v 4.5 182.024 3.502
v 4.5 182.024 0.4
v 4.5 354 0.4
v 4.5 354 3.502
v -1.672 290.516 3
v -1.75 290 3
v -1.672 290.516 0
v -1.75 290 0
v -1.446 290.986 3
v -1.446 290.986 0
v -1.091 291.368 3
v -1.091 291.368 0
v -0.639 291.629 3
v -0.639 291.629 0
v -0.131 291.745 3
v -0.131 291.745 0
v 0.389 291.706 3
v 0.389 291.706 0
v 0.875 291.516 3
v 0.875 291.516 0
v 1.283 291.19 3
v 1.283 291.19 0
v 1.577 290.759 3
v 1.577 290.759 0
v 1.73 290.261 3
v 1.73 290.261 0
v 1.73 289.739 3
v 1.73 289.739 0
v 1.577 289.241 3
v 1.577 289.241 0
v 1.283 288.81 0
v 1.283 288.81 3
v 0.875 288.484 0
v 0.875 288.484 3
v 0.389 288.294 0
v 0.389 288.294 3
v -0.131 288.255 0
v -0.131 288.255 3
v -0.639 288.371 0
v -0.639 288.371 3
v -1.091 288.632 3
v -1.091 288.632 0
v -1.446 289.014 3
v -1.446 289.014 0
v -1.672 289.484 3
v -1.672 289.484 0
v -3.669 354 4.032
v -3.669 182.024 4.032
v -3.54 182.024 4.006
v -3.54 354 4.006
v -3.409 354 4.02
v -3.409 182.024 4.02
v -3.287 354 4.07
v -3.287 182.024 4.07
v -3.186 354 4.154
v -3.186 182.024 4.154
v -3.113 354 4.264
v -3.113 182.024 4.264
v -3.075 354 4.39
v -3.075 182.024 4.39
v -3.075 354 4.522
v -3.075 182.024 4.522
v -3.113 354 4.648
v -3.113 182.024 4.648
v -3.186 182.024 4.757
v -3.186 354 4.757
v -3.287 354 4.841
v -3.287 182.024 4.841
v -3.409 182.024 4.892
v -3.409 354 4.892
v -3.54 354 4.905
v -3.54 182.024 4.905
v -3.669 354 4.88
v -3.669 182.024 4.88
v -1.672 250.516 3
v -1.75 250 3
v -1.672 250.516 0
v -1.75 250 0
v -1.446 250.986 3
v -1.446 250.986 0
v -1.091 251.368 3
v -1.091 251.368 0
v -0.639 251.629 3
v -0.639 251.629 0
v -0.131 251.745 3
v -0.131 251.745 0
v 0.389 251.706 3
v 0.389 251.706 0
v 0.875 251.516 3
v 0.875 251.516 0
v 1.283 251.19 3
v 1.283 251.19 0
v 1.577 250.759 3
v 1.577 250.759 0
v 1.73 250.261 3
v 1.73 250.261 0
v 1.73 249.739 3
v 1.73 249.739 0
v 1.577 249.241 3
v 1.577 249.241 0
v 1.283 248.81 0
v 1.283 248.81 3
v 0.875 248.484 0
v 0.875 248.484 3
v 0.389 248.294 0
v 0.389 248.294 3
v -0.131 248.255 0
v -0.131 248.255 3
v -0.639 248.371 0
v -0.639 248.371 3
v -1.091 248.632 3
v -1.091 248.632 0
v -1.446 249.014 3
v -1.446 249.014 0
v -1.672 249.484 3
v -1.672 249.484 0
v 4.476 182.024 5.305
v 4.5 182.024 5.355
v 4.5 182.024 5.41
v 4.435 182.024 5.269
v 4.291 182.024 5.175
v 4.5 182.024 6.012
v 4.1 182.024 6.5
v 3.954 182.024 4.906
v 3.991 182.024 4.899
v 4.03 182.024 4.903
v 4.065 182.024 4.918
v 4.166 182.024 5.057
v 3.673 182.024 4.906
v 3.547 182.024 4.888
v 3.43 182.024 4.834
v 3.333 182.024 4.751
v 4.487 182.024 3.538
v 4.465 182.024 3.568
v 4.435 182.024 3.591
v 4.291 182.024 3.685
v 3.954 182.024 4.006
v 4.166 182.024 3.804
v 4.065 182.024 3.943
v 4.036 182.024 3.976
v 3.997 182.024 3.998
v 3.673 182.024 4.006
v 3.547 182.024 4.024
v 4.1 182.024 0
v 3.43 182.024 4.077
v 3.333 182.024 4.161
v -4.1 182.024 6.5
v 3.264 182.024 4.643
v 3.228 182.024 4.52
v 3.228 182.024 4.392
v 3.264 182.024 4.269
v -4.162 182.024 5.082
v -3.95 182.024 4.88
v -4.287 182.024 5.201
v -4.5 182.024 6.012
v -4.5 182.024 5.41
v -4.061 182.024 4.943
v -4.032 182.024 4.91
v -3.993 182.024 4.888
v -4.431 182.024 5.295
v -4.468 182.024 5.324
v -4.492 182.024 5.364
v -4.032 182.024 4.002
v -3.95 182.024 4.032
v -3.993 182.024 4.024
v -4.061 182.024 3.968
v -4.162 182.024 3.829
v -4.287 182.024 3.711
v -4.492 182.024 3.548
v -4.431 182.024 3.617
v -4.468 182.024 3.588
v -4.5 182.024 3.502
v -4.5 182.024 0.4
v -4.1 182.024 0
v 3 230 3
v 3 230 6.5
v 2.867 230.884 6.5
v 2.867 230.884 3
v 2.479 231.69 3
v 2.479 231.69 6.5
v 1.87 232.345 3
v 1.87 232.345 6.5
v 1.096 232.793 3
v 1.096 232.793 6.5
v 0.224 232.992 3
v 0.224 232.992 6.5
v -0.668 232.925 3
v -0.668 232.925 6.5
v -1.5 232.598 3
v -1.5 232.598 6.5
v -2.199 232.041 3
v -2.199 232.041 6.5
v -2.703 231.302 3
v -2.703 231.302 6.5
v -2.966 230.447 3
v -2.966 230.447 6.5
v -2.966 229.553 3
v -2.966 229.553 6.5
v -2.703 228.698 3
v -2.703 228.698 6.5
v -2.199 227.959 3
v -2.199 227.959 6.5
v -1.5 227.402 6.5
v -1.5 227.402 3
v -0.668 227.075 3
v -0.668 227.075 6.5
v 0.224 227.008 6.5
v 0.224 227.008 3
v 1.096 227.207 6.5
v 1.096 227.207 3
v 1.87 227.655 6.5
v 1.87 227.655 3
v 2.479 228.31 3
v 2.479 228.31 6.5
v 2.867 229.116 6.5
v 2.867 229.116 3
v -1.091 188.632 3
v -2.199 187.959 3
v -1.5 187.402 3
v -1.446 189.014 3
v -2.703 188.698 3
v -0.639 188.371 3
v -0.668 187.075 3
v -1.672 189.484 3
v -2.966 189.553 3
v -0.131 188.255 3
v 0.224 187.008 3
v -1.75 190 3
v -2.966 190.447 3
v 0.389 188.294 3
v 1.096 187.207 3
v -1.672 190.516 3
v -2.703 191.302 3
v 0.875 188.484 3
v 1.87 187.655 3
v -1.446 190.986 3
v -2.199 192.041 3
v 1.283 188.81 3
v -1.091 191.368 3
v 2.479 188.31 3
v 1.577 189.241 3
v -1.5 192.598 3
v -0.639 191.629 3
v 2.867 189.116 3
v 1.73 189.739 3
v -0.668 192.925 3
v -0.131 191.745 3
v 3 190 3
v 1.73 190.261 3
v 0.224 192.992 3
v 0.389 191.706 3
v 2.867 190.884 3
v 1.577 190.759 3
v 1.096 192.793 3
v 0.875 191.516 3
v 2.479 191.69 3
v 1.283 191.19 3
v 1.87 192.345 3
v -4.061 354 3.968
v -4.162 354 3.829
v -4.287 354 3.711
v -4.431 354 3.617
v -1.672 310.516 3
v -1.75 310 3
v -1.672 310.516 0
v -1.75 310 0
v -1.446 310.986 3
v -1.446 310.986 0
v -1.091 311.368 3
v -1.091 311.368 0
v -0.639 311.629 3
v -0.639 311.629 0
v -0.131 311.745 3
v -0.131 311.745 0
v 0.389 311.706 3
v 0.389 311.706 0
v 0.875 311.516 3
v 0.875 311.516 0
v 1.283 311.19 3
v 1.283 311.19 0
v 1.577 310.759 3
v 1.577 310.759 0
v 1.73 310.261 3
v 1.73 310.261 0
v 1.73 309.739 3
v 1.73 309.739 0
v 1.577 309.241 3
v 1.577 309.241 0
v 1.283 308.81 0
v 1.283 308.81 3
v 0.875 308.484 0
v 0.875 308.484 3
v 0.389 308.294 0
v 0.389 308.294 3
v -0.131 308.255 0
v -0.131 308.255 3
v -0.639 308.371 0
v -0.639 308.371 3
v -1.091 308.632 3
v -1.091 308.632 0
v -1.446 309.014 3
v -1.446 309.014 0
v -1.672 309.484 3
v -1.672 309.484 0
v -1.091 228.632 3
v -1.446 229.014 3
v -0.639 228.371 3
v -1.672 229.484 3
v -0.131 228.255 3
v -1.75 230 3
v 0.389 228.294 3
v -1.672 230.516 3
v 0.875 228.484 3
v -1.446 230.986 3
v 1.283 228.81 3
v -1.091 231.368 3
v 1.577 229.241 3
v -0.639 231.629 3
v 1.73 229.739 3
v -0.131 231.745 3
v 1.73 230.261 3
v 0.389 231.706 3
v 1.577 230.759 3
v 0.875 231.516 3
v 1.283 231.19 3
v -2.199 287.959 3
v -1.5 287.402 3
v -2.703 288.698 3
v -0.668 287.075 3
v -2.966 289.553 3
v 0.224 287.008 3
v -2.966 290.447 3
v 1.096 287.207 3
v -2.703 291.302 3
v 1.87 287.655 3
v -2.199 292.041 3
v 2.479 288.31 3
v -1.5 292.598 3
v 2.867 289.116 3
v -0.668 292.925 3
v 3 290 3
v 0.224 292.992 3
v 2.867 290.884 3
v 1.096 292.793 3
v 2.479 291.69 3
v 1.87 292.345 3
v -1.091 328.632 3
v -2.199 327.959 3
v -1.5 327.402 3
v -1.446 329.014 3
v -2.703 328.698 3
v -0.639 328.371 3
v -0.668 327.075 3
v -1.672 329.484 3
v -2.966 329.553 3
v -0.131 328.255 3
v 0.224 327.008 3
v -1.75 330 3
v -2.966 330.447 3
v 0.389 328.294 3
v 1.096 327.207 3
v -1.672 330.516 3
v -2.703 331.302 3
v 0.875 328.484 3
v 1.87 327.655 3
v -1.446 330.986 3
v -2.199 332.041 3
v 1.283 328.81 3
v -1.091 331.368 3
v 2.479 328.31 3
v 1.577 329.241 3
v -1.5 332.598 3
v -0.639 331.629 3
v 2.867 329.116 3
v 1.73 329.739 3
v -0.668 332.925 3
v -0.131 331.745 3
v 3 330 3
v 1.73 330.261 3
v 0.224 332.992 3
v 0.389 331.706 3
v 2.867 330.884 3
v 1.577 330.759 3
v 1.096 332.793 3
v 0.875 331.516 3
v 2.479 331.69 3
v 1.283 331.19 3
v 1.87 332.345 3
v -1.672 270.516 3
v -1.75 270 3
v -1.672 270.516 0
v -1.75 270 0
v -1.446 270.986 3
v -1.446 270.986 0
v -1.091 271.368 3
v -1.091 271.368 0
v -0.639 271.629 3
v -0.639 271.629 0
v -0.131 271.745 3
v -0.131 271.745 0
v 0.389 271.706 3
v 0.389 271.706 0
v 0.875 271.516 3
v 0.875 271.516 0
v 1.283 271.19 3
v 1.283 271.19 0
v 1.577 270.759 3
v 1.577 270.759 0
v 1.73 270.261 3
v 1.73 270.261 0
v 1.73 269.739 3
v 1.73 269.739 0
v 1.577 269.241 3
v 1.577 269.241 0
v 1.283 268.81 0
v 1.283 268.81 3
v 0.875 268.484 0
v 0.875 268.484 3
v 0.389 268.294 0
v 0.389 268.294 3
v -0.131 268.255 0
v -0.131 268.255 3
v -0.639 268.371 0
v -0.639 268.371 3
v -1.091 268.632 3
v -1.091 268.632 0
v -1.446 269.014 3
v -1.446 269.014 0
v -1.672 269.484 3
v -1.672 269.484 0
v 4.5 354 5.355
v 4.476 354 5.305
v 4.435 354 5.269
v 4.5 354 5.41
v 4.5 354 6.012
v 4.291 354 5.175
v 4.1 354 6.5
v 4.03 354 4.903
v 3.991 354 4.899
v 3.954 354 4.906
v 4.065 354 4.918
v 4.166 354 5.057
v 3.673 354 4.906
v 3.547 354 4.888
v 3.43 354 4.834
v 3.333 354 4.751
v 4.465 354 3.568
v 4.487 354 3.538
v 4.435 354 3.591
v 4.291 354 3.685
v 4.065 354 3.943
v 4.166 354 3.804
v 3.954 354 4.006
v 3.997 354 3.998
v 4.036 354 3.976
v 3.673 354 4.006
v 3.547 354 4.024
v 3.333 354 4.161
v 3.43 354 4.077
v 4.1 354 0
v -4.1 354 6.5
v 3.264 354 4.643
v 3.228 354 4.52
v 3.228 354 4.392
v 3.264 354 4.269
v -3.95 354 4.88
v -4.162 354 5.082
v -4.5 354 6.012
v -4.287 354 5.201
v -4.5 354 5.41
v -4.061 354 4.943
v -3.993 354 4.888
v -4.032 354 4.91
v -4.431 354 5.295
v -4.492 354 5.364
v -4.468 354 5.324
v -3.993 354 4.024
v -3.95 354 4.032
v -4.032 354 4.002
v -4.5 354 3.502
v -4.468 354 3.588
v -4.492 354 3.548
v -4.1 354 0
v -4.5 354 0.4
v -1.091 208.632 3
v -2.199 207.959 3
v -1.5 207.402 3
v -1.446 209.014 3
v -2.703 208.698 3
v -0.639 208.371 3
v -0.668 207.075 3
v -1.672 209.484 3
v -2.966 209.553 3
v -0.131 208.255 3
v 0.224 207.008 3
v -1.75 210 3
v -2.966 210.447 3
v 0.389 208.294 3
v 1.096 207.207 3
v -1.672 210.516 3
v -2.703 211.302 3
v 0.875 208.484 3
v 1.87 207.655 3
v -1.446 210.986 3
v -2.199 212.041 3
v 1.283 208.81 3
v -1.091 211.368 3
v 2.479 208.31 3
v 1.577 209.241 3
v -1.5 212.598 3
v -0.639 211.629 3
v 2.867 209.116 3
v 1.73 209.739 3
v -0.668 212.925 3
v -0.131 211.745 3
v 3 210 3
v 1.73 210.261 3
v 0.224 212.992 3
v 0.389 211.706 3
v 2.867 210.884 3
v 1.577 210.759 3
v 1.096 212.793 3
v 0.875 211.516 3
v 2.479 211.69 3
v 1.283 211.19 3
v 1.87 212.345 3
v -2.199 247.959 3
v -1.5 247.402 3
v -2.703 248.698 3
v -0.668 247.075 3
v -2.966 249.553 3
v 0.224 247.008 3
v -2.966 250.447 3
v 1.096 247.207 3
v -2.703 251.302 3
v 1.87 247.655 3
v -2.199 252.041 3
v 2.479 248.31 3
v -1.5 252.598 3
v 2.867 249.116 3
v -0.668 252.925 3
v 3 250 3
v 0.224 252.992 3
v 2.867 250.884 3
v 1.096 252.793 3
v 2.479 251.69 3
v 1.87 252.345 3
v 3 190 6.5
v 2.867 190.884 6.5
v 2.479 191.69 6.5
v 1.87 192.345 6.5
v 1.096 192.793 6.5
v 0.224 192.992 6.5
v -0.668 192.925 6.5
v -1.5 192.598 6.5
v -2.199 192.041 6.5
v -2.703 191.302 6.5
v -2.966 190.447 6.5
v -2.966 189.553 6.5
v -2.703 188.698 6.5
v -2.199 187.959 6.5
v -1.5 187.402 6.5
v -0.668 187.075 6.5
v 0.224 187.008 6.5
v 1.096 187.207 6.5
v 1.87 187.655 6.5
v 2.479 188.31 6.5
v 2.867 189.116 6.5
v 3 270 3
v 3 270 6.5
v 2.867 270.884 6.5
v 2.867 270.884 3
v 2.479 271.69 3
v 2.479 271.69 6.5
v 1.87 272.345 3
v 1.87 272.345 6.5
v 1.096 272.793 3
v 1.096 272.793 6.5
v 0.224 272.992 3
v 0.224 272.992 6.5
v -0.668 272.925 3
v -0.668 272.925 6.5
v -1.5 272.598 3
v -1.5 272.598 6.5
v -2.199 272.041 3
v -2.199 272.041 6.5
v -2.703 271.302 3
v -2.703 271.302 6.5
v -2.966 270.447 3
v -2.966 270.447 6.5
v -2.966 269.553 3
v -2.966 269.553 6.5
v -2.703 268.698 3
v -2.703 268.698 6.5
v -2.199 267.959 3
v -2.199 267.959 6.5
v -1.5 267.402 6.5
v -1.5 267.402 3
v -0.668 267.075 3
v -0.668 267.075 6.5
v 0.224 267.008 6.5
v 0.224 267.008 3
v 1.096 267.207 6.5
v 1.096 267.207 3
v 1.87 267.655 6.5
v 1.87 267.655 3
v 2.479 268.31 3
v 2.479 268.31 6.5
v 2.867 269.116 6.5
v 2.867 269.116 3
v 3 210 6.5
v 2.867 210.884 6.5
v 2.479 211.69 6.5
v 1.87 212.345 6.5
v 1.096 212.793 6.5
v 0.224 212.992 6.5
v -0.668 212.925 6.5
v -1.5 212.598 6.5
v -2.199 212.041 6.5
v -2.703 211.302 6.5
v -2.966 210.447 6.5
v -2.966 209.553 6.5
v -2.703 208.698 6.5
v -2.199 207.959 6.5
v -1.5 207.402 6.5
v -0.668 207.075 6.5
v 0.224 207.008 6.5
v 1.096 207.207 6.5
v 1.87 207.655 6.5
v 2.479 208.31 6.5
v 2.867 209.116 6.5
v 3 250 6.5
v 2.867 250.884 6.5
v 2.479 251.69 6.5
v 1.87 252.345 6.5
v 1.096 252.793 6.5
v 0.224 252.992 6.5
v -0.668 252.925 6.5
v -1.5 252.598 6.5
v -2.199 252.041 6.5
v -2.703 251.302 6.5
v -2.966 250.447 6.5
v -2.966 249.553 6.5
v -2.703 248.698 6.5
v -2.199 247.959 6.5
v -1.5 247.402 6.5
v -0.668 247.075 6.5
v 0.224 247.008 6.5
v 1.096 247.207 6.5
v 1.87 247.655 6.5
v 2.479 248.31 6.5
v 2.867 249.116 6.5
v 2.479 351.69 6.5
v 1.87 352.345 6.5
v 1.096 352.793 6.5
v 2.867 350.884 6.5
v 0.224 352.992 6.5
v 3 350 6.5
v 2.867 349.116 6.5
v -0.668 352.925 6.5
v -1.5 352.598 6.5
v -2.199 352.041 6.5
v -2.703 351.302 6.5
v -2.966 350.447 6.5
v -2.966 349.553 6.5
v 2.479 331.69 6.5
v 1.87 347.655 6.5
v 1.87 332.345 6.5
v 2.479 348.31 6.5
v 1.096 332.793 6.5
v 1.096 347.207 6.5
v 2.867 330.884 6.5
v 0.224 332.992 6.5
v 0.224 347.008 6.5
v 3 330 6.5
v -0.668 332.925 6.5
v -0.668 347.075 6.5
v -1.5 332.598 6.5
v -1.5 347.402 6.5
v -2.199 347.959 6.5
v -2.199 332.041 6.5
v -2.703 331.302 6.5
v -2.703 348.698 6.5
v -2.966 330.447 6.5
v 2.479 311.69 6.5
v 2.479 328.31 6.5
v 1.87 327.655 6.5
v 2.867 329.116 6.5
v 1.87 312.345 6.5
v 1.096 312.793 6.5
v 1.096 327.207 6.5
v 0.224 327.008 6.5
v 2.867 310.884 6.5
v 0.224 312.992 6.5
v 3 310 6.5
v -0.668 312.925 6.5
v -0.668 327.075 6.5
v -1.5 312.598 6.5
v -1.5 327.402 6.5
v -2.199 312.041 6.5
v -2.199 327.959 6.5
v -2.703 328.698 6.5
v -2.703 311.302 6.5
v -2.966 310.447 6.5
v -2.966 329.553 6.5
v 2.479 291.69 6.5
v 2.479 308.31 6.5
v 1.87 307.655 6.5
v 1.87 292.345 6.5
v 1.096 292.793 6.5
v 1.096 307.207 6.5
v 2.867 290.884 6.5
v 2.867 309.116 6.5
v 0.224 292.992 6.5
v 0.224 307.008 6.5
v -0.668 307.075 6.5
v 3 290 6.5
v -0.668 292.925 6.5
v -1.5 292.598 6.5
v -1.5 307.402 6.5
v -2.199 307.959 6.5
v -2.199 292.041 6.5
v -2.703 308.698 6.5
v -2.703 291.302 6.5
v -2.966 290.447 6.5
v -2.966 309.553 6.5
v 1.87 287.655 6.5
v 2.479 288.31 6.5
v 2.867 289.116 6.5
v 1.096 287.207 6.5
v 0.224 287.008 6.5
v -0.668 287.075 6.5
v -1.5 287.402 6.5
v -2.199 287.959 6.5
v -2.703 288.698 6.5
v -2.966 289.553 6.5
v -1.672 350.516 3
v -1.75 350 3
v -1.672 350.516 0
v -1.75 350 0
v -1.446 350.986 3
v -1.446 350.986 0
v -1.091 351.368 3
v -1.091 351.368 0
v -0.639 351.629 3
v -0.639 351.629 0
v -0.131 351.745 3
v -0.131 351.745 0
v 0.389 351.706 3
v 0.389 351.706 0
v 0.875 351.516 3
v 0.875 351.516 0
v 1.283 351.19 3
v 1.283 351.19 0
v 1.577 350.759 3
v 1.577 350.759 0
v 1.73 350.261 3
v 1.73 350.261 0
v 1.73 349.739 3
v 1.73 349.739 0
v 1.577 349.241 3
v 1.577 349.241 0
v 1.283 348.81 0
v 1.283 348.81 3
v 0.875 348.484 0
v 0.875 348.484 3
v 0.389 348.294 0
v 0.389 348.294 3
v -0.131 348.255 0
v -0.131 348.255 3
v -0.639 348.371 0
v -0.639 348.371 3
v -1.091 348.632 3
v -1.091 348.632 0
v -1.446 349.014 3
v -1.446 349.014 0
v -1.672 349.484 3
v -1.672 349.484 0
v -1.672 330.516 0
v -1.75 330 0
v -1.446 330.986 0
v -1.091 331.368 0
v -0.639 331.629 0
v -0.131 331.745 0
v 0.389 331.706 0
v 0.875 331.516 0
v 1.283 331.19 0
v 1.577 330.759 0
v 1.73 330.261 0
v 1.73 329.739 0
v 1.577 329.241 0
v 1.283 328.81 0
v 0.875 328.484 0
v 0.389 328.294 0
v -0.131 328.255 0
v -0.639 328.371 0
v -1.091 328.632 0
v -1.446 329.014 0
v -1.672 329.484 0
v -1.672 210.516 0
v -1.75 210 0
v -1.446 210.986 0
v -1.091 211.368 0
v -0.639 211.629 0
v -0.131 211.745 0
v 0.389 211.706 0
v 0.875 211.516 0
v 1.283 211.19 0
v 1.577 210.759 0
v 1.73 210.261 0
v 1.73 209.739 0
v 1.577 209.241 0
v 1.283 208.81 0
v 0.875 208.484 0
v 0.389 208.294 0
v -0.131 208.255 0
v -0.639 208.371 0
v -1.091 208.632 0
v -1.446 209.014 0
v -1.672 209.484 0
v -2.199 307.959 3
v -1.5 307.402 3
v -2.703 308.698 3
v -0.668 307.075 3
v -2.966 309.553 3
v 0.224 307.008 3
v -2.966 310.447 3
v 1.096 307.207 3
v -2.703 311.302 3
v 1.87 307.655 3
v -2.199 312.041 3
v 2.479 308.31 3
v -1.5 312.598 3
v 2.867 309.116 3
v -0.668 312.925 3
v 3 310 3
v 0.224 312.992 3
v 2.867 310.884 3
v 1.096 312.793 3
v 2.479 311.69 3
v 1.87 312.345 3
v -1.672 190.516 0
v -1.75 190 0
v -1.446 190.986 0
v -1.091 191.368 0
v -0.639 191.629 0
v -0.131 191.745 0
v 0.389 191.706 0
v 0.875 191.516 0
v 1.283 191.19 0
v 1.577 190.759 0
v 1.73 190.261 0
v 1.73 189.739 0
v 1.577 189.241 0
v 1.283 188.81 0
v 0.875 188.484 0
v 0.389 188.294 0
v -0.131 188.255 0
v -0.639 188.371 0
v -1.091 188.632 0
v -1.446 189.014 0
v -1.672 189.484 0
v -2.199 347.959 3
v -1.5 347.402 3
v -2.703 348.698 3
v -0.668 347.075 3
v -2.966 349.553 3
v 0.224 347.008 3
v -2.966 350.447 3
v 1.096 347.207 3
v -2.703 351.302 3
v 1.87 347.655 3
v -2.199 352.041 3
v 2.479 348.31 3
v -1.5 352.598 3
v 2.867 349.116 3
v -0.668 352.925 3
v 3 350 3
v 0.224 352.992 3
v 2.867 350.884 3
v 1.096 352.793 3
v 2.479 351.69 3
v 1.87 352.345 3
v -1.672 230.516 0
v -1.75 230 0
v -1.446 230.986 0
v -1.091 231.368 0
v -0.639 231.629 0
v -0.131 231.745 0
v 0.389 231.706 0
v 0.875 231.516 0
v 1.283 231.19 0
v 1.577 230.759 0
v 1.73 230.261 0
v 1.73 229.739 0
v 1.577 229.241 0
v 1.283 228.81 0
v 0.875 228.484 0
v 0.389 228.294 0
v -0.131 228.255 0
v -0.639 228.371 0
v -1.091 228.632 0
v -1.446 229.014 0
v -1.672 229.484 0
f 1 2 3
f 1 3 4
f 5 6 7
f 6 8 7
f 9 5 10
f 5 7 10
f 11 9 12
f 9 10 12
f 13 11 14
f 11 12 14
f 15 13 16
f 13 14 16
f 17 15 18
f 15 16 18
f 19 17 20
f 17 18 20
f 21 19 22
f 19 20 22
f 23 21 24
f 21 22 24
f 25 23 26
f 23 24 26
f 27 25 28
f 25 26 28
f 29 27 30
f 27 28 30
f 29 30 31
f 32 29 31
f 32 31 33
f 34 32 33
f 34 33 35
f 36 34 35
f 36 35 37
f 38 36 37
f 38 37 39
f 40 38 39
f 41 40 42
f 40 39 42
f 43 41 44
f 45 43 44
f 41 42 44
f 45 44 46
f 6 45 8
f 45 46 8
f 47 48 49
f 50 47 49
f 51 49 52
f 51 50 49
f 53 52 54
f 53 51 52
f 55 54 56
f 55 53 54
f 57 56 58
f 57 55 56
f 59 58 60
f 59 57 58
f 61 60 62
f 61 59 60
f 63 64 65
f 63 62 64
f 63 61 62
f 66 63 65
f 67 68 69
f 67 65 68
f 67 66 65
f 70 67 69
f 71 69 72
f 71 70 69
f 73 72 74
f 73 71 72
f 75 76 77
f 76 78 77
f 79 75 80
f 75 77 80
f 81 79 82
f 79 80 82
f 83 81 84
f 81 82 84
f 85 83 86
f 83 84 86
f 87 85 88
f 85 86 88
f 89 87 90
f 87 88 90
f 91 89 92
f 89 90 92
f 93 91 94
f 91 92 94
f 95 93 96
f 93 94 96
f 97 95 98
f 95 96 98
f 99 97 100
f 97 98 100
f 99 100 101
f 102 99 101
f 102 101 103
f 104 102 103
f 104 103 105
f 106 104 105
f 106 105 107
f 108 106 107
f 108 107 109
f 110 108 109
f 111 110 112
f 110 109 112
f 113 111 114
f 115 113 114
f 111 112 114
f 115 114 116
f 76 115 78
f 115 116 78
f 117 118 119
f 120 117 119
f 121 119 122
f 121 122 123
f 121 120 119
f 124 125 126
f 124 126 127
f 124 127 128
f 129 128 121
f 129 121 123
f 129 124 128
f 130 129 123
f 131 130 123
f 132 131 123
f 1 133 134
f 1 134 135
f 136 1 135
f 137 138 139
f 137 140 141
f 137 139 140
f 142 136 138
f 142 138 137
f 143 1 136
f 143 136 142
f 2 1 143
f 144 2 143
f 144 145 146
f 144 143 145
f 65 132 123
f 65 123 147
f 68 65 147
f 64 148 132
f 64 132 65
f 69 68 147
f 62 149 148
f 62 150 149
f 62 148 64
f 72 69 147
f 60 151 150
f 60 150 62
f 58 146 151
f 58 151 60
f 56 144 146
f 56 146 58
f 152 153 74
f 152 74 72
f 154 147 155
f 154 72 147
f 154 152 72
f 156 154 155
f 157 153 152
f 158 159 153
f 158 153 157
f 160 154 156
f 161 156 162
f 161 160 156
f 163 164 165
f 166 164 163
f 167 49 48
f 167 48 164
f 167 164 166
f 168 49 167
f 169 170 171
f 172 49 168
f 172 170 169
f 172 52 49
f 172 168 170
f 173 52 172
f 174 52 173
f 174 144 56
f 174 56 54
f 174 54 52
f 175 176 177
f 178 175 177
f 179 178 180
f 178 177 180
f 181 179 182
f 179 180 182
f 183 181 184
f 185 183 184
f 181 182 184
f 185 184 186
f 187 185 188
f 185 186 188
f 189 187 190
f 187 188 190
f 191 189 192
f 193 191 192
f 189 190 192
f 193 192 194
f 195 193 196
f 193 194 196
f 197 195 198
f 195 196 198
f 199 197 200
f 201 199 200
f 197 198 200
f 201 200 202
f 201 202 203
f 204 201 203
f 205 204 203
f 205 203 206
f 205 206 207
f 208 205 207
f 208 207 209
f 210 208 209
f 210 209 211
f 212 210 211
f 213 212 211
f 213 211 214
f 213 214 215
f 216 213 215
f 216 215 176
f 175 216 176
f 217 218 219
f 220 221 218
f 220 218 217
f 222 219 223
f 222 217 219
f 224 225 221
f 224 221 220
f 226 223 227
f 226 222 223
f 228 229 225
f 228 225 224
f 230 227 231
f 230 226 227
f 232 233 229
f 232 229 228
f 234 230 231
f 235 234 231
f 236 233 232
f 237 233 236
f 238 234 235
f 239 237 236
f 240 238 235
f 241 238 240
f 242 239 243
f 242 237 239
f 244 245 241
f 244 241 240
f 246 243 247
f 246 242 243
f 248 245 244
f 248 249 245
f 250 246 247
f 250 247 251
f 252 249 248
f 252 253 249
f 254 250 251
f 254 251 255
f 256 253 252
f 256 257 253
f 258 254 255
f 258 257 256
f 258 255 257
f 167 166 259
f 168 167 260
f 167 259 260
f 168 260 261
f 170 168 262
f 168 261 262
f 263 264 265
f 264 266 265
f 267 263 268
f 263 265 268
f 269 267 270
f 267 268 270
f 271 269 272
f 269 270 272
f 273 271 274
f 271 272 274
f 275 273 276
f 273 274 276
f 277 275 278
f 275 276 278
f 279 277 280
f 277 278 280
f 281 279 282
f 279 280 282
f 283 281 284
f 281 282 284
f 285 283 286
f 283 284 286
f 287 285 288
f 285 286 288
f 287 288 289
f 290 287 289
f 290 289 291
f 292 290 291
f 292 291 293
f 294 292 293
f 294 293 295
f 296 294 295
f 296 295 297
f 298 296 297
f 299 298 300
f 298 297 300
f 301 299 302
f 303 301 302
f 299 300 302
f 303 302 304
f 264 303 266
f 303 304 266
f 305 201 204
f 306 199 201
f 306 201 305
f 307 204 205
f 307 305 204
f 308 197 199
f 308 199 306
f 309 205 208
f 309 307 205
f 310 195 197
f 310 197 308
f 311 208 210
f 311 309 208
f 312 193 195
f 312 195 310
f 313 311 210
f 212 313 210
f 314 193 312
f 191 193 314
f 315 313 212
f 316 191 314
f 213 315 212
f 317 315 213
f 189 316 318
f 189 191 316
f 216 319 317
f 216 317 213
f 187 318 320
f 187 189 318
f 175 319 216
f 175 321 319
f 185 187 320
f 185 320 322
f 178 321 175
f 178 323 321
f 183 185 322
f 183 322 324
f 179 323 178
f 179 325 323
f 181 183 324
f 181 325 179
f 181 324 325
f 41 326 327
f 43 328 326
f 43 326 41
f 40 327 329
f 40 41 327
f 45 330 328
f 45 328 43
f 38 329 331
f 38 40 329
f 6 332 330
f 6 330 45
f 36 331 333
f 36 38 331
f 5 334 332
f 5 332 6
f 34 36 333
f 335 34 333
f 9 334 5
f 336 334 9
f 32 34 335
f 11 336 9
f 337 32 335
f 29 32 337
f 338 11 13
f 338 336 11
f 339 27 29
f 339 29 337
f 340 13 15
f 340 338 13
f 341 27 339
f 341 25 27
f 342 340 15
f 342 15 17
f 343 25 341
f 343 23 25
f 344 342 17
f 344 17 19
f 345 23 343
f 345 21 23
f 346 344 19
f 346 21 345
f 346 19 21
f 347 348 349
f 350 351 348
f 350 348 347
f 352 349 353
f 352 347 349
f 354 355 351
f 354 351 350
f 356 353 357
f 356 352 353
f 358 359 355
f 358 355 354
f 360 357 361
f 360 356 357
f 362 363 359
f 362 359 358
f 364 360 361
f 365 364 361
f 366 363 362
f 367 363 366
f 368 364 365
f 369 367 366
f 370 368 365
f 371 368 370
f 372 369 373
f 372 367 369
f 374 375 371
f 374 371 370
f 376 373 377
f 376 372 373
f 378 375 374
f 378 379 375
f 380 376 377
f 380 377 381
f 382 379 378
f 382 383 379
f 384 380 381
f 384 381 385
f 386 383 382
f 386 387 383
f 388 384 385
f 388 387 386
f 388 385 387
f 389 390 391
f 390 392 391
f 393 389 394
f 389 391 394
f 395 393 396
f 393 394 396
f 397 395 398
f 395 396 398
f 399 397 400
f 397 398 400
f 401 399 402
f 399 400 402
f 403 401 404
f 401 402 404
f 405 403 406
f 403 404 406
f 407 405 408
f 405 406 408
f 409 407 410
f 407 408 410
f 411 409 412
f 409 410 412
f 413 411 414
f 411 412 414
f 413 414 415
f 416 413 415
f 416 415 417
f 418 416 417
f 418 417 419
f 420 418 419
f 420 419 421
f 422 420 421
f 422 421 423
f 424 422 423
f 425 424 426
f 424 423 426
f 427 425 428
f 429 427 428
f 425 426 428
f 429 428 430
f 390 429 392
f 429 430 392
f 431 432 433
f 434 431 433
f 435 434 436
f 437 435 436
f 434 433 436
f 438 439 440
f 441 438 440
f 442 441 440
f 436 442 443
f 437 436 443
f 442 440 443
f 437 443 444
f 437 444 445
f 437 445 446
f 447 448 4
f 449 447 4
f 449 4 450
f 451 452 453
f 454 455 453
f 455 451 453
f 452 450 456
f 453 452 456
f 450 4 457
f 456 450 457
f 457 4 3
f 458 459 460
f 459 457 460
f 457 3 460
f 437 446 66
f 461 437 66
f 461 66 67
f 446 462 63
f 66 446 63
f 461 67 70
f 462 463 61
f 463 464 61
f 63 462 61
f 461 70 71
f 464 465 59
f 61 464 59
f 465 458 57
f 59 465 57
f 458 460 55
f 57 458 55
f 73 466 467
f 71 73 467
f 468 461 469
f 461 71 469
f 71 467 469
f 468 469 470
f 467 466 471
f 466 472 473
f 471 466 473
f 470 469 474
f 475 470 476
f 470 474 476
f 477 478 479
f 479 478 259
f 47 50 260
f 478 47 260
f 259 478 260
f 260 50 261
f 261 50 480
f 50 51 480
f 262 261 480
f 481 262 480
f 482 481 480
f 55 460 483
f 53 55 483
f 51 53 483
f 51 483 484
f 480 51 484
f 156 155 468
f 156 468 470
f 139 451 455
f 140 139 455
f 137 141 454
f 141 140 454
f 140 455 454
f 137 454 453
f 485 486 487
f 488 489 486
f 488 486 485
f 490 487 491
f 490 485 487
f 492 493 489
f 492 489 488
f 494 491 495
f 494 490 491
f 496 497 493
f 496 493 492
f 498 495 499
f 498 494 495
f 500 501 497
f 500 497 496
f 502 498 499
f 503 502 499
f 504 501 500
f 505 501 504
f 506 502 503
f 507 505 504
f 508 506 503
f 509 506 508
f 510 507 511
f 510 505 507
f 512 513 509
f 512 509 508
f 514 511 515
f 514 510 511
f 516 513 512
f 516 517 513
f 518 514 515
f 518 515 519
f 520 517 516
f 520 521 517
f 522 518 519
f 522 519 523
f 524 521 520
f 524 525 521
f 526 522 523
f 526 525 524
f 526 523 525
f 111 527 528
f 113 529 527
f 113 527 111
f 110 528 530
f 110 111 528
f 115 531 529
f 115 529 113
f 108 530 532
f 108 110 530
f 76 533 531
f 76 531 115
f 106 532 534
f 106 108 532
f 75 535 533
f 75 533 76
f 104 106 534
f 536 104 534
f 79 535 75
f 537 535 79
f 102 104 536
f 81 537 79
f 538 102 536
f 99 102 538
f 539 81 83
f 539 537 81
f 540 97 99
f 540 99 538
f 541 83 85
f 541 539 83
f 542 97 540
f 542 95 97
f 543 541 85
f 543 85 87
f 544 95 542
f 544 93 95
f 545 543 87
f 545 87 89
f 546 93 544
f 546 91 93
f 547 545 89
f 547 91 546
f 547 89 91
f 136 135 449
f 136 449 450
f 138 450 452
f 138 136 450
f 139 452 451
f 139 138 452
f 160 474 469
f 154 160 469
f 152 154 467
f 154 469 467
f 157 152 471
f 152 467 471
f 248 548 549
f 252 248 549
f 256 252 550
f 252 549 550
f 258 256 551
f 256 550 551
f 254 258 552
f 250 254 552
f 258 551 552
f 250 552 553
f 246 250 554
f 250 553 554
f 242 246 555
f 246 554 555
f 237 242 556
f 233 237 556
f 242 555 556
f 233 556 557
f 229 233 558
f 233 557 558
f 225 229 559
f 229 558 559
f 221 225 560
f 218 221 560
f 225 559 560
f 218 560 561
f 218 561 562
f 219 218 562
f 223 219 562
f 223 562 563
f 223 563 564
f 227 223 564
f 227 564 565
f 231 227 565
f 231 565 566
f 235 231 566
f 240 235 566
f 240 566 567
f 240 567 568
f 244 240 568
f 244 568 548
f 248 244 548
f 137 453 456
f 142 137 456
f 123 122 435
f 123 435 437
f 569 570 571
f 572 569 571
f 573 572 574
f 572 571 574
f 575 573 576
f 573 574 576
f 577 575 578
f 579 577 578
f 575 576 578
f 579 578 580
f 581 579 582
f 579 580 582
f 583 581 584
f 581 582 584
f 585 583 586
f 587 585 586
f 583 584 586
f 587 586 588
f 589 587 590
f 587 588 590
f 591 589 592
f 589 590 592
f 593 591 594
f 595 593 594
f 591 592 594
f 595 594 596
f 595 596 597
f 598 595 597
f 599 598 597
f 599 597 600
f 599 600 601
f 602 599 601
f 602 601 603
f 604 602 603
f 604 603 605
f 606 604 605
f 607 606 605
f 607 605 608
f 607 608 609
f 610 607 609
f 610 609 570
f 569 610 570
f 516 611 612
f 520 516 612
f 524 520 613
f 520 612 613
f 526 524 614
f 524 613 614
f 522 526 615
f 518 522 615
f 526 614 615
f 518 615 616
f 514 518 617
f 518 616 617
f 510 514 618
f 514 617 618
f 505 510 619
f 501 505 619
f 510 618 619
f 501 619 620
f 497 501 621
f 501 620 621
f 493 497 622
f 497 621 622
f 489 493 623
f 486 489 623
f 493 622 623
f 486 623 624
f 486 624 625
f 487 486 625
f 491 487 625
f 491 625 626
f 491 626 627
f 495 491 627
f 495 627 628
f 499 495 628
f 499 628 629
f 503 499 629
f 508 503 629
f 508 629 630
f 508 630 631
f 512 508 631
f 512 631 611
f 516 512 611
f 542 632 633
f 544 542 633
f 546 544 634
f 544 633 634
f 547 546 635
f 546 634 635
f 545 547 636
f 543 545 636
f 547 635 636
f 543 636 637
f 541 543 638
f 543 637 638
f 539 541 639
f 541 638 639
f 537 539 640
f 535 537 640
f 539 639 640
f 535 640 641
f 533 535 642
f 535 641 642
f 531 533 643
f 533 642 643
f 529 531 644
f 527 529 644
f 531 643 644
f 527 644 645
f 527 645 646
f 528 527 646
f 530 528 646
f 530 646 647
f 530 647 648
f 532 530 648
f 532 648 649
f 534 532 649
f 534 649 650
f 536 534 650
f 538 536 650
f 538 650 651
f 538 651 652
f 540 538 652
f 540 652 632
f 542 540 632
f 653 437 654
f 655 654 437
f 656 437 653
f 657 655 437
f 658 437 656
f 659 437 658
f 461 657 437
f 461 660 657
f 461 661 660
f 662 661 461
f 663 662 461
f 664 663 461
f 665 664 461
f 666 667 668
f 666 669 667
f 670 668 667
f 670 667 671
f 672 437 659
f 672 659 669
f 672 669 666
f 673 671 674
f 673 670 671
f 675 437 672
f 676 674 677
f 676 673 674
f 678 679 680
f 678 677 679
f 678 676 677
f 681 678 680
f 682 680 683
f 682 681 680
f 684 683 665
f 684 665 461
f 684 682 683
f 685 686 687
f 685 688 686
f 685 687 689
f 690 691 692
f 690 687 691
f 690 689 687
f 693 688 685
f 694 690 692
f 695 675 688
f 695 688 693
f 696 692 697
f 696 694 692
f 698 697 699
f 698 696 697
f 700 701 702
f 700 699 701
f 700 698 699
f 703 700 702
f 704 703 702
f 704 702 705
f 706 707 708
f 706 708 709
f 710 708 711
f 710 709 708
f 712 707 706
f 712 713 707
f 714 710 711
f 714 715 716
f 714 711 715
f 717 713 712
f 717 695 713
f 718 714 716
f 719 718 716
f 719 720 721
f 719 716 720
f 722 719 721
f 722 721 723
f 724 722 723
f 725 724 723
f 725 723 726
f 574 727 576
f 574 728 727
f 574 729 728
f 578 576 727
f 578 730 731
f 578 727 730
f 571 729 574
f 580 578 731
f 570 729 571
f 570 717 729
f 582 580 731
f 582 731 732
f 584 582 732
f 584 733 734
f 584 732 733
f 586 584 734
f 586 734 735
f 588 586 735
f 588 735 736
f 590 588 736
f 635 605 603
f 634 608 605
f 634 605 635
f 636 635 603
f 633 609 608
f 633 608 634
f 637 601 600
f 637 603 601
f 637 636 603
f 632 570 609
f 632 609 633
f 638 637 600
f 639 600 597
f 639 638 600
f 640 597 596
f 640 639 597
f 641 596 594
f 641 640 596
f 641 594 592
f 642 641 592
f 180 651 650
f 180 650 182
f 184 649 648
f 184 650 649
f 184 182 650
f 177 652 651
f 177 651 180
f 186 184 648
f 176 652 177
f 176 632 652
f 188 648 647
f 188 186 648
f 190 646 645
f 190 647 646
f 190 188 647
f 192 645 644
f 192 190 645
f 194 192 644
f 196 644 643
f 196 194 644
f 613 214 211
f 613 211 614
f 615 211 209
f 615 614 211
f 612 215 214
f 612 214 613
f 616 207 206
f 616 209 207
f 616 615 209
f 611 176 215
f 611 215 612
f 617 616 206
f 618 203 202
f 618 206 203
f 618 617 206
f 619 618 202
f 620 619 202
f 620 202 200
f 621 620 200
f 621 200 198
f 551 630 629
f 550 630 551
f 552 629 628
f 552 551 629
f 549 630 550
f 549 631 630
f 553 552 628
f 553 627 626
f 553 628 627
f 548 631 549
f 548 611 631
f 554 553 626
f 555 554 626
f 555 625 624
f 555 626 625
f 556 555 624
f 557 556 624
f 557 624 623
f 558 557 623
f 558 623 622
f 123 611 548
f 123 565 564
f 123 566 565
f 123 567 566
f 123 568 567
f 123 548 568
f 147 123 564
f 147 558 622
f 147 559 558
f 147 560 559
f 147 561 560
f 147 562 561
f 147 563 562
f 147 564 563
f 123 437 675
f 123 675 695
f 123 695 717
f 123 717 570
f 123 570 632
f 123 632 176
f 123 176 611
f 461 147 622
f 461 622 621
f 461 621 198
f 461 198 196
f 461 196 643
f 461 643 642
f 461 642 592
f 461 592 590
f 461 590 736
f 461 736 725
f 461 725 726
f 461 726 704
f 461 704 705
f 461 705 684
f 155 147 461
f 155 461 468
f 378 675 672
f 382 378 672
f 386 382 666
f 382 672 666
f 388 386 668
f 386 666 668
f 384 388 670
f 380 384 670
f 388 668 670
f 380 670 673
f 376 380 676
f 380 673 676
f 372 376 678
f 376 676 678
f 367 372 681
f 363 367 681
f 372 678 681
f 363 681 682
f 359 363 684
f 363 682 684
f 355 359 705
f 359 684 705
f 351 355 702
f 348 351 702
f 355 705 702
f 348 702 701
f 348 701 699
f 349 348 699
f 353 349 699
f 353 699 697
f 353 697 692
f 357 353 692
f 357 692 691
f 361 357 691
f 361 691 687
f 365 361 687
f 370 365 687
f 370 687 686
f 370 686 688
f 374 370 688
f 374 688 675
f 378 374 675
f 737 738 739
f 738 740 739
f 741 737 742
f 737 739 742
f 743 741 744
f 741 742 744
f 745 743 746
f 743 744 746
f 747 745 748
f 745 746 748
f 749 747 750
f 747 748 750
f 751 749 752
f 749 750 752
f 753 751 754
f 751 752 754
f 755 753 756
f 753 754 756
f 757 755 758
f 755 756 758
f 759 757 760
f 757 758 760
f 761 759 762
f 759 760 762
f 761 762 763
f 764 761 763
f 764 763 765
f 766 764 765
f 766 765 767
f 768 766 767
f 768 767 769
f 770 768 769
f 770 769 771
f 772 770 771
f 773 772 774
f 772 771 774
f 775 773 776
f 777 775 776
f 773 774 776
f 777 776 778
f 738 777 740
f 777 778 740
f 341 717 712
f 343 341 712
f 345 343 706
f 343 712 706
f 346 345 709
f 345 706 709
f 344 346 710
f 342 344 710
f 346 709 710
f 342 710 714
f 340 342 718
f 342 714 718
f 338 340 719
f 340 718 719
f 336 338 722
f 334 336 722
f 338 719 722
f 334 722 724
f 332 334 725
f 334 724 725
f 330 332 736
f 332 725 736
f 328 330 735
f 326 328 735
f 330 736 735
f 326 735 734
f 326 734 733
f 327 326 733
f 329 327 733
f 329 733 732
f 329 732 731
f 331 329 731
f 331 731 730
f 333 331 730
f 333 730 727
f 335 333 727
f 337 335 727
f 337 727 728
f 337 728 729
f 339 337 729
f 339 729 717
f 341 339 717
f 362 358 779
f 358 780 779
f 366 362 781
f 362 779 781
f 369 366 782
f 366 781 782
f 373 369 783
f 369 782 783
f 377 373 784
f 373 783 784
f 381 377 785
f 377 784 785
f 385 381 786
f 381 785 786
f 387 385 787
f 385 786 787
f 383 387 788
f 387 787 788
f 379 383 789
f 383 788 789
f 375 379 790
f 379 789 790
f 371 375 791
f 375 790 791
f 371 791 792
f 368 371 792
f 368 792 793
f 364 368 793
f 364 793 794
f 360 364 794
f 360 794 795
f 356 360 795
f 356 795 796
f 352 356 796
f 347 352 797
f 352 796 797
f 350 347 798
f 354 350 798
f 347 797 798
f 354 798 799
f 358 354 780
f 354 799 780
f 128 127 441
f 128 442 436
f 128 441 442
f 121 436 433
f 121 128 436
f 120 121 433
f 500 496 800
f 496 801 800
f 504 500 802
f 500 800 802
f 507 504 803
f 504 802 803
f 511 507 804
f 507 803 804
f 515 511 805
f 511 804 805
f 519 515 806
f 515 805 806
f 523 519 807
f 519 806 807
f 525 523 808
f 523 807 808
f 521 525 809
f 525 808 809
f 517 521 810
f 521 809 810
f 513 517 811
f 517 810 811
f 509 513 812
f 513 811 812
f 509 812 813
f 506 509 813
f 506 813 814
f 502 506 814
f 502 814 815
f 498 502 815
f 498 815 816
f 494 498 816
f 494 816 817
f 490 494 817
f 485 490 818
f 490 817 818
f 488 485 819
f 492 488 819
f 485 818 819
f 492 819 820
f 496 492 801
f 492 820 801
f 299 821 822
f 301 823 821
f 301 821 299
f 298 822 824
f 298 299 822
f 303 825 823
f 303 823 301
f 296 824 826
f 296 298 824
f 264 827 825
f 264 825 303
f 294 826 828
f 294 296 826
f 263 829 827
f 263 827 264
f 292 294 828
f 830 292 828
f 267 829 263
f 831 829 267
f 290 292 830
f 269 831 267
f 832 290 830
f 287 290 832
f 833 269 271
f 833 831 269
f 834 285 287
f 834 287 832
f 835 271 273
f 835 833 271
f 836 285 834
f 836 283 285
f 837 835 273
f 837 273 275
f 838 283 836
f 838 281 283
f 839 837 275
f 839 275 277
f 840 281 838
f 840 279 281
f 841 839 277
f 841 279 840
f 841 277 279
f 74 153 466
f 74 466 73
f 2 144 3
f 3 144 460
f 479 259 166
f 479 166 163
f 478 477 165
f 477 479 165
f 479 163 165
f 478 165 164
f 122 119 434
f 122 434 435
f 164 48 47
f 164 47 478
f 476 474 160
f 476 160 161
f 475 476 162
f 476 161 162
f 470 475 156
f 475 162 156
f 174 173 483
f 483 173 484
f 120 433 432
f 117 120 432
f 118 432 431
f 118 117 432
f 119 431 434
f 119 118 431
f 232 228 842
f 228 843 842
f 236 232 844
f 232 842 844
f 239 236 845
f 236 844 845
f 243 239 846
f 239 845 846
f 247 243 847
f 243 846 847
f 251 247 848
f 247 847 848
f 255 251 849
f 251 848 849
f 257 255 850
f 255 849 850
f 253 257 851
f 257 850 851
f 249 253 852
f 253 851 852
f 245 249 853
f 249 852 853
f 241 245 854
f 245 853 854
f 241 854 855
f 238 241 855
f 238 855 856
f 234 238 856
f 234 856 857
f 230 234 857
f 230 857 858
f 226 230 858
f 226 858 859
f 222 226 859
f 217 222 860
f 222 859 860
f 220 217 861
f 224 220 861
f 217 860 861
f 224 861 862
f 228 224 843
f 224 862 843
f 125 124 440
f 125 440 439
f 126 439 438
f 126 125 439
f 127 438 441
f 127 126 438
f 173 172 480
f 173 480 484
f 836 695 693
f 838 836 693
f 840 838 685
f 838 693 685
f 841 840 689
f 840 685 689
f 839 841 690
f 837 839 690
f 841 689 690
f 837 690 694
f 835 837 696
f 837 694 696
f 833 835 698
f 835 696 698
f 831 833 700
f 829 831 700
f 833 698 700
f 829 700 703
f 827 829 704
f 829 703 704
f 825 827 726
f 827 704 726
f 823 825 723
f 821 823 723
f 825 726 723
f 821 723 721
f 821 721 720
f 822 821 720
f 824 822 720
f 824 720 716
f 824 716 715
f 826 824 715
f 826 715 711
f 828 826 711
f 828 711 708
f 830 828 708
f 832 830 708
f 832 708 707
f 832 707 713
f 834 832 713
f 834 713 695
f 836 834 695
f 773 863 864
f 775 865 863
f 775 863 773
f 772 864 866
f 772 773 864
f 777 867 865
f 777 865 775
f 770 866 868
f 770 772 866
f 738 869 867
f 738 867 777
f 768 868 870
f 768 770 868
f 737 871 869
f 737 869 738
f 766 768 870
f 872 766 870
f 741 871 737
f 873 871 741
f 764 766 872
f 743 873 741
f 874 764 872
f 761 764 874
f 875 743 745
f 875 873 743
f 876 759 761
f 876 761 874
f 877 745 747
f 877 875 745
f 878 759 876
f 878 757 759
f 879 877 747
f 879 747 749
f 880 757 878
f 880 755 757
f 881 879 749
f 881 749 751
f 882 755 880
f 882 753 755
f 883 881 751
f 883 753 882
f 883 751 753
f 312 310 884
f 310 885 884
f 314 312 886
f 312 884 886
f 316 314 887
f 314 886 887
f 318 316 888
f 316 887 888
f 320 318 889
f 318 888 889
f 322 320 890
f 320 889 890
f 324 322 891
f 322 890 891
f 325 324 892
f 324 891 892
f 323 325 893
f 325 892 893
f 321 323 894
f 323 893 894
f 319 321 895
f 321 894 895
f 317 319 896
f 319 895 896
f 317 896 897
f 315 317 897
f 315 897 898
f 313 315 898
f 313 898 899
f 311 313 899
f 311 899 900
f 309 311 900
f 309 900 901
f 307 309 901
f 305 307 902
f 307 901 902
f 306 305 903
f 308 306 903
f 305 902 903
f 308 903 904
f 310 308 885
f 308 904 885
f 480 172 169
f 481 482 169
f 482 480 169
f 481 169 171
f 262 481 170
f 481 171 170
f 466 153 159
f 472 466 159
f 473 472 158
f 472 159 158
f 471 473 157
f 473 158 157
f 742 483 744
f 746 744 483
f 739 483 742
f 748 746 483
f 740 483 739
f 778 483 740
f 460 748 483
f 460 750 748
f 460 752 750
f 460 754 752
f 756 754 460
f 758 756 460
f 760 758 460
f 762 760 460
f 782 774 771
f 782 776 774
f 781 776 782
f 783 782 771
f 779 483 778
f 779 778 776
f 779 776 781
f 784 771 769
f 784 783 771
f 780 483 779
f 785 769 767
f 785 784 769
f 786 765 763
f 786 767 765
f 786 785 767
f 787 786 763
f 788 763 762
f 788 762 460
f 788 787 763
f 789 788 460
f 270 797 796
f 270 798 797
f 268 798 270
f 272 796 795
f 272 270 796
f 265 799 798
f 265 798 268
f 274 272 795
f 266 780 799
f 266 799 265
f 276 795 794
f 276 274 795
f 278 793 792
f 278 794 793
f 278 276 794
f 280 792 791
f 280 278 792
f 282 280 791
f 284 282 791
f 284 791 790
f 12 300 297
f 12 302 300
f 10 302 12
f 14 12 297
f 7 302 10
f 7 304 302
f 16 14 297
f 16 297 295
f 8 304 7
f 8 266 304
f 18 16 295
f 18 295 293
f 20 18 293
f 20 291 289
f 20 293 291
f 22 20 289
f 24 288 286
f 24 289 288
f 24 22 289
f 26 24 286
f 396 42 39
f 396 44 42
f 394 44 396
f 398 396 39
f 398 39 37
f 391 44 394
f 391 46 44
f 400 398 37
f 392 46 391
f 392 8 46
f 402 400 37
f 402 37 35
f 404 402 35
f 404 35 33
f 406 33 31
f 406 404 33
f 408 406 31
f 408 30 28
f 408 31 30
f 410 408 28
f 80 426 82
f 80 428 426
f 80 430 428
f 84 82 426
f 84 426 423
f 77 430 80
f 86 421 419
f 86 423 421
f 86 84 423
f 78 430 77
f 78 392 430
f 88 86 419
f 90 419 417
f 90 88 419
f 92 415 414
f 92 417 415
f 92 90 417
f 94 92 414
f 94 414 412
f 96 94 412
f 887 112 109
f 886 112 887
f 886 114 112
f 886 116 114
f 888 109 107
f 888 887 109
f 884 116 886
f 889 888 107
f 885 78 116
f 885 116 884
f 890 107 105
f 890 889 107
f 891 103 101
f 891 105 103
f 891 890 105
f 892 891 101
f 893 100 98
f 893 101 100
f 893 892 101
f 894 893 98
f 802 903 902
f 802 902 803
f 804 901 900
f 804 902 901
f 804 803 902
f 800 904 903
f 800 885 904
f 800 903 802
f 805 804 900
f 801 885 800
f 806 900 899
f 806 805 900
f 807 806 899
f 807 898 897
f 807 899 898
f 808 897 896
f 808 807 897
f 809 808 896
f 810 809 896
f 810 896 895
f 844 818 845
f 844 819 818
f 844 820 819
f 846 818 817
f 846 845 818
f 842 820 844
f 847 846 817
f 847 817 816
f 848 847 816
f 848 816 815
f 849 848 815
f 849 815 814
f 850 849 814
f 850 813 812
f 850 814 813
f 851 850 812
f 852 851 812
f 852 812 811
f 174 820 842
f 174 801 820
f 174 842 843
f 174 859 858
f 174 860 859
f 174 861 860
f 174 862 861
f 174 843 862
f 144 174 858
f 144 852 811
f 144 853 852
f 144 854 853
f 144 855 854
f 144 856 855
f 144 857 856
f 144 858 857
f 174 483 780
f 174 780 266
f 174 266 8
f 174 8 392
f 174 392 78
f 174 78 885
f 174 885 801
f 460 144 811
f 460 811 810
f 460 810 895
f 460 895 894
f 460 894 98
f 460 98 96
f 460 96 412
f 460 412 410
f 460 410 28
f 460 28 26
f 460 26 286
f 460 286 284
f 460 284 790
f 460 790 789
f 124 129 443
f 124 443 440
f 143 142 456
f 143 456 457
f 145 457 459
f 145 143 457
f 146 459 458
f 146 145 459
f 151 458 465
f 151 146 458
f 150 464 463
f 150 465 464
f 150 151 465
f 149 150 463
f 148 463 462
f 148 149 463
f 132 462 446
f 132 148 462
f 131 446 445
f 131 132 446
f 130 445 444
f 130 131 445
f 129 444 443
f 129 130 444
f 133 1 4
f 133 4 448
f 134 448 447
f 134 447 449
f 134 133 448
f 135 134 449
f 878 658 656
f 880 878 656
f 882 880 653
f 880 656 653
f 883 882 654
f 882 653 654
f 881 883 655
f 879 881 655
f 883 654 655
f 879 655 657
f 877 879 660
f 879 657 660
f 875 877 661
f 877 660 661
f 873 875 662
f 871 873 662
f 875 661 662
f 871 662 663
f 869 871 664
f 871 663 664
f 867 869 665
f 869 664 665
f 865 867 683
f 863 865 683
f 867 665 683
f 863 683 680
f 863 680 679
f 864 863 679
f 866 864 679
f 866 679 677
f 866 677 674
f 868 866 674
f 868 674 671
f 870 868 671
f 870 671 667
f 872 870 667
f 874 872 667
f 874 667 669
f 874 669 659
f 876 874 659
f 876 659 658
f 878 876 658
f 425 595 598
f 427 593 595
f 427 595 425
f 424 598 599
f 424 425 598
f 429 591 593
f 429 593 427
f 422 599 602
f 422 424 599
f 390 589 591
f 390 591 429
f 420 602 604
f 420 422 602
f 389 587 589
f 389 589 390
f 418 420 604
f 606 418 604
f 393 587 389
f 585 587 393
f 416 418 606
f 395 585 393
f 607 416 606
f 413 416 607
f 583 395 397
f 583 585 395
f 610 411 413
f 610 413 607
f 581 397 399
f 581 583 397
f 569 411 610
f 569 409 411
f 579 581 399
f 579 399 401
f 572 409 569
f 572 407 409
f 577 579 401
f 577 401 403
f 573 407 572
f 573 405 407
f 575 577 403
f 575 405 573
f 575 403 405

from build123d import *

# Parameters (mm, degrees)
RESSALTO_EXTRUS_O1_DEPTH                             = 1000
CORTE_EXTRUS_O1_START                                = -1000
CORTE_EXTRUS_O1_DEPTH                                = 1000
CORTE_EXTRUS_O2_DEPTH                                = 1001.031261626
CORTE_EXTRUS_O3_DEPTH                                = 1001.031261626
CORTE_EXTRUS_O4_DEPTH                                = 1001.031261626
CORTE_EXTRUS_O5_DEPTH                                = 0.002166667
CORTE_EXTRUS_O6_DEPTH                                = 0.002166667
CORTE_EXTRUS_O7_DEPTH                                = 0.002166667
CORTE_EXTRUS_O8_DEPTH                                = 0.002166667
INCLINA_O1_ANGLE                                     = 45.1469538
ESBO_O10_W                                           = 0.450000001
ESBO_O10_H                                           = 1000
REBAIXO_PARA_PARAFUSO_DE_M_QUINA_DE_CABE_D           = 3.5
REBAIXO_PARA_PARAFUSO_DE_M_QUINA_DE_CABE_CBORE_D     = 6
REBAIXO_PARA_PARAFUSO_DE_M_QUINA_DE_CABE_CBORE_DEPTH = 3.50000002
CHANFRO1_SIZE                                        = 0.062563219
CHANFRO1_SIZE2                                       = 0.062205617
CHANFRO3_START                                       = -3.730761794
CHANFRO3_DEPTH                                       = 0.399013115
CHANFRO4_SIZE                                        = 0.4
FILETE1_R                                            = 0.130000023
SKETCH1_W                                            = 36.072768502
SKETCH1_H                                            = 659.552877555
SKETCH1_W_2                                          = 21.632087489
SKETCH1_H_2                                          = 215.829832124
CUT_EXTRUDE1_DEPTH                                   = 10


with BuildPart() as part:
    # Esboço1 → Ressalto-extrusão1 (new body)
    with BuildSketch(Plane.XZ):
        with BuildLine():
            Line((4.5, 5.4097155), (4.5, 6.01167813))
            Line((4.5, 6.01167813), (4.1, 6.50000002))
            Line((4.1, 6.50000002), (-4.1, 6.50000002))
            Line((-4.1, 6.50000002), (-4.5, 6.01167813))
            Line((-4.5, 6.01167813), (-4.5, 2e-08))
            Line((-4.5, 2e-08), (4.5, 2e-08))
            Line((4.5, 2e-08), (4.5, 3.50196265))
            ThreePointArc((4.5, 3.50196265), (4.477413879, 3.553810372), (4.43494978, 3.59116167))
            ThreePointArc((4.43494978, 3.59116167), (3.930462682, 4.43021964), (4.43494978, 5.26927761))
            ThreePointArc((4.43494978, 5.26927761), (4.490651601, 5.328761203), (4.5, 5.4097155))
        make_face()
    extrude(amount=-RESSALTO_EXTRUS_O1_DEPTH)

    # Esboço2 → Corte-extrusão1 (cut)
    with BuildSketch(Plane(origin=(0, 1000, 0), x_dir=(-1, 0, 0), z_dir=(0, 1, 0)).offset(CORTE_EXTRUS_O1_START)):
        with BuildLine():
            Line((-4.030498711, 4.00588336), (-3.673447948, 4.00588336))
            ThreePointArc((-3.673447948, 4.00588336), (-3.223447946, 4.455883362), (-3.673447948, 4.905883363))
            Line((-3.673447948, 4.905883363), (-3.953580008, 4.905883363))
            ThreePointArc((-3.953580008, 4.905883363), (-4.010719931, 4.899199784), (-4.065149208, 4.917830263))
            ThreePointArc((-4.065149208, 4.917830263), (-3.93114763, 4.466290066), (-4.030498711, 4.00588336))
        make_face()
    extrude(amount=CORTE_EXTRUS_O1_DEPTH, mode=Mode.SUBTRACT)

    # Esboço3 → Corte-extrusão2 (cut, through all)
    with BuildSketch(Plane(origin=(0, 1000, 0), x_dir=(-1, 0, 0), z_dir=(0, 1, 0))):
        with BuildLine():
            Line((4.5, 4.03150278), (4.5, 4.88017535))
            Line((4.5, 4.88017535), (3.66946318, 4.88017535))
            ThreePointArc((3.66946318, 4.88017535), (3.969667593, 4.455839065), (3.66946318, 4.03150278))
            Line((3.66946318, 4.03150278), (4.5, 4.03150278))
        make_face()
    extrude(amount=-CORTE_EXTRUS_O2_DEPTH, mode=Mode.SUBTRACT)

    # Esboço4 → Corte-extrusão3 (cut, through all)
    with BuildSketch(Plane(origin=(0, 1000, 0), x_dir=(-1, 0, 0), z_dir=(0, 1, 0))):
        with BuildLine():
            Line((4.026513974, 4.88017535), (4.5, 4.88017535))
            Line((4.5, 4.88017535), (4.5, 5.328056964))
            ThreePointArc((4.5, 5.328056964), (4.223646078, 5.145991535), (4.026513974, 4.88017535))
        make_face()
    extrude(amount=-CORTE_EXTRUS_O3_DEPTH, mode=Mode.SUBTRACT)

    # Esboço5 → Corte-extrusão4 (cut, through all)
    with BuildSketch(Plane(origin=(0, 1000, 0), x_dir=(-1, 0, 0), z_dir=(0, 1, 0))):
        with BuildLine():
            Line((4.5, 3.583620931), (4.5, 4.03150278))
            Line((4.5, 4.03150278), (4.026513856, 4.03150278))
            ThreePointArc((4.026513856, 4.03150278), (4.223645982, 3.76568645), (4.5, 3.583620931))
        make_face()
    extrude(amount=-CORTE_EXTRUS_O4_DEPTH, mode=Mode.SUBTRACT)

    # Esboço6 → Corte-extrusão5 (cut)
    with BuildSketch(Plane(origin=(0, 1000, 0), x_dir=(-1, 0, 0), z_dir=(0, 1, 0))):
        Polygon((0.891369267, 3.403698133), (0.714701433, 3.168235633), (0.2187042, 2.61105), (1.0945792, 2.61105), (1.0945792, 2.695983333), (0.398689633, 2.695983333), (0.794326433, 3.149466667), (0.9743123, 3.3891), (1.067110588, 3.573407857), (0.95413722, 3.802321701), (0.7876908, 3.88505), (0.54301, 3.88505), (0.375434678, 3.803592619), (0.295011167, 3.6384023), (0.295011167, 3.562), (0.3812718, 3.562), (0.3812718, 3.631766667), (0.437672733, 3.743620833), (0.549645633, 3.800116667), (0.7802262, 3.800116667), (0.893028067, 3.743810633), (0.976240026, 3.576039029), align=None)
    extrude(amount=-CORTE_EXTRUS_O5_DEPTH, mode=Mode.SUBTRACT)

    # Esboço7 → Corte-extrusão6 (cut)
    with BuildSketch(Plane.XZ):
        Polygon((-0.214632167, 3.88505), (-0.953983333, 3.88505), (-0.953983333, 2.61105), (-0.214632167, 2.61105), (-0.214632167, 2.695983333), (-0.86905, 2.695983333), (-0.86905, 3.205583333), (-0.5123963, 3.205583333), (-0.5123963, 3.290516667), (-0.86905, 3.290516667), (-0.86905, 3.800116667), (-0.214632167, 3.800116667), align=None)
    extrude(amount=-CORTE_EXTRUS_O6_DEPTH, mode=Mode.SUBTRACT)

    # Esboço8 → Corte-extrusão7 (cut)
    with BuildSketch(Plane(origin=(0, 1000, 0), x_dir=(-1, 0, 0), z_dir=(0, 1, 0))):
        Polygon((-0.214632167, 3.88505), (-0.953983333, 3.88505), (-0.953983333, 2.61105), (-0.214632167, 2.61105), (-0.214632167, 2.695983333), (-0.86905, 2.695983333), (-0.86905, 3.205583333), (-0.5123963, 3.205583333), (-0.5123963, 3.290516667), (-0.86905, 3.290516667), (-0.86905, 3.800116667), (-0.214632167, 3.800116667), align=None)
    extrude(amount=-CORTE_EXTRUS_O7_DEPTH, mode=Mode.SUBTRACT)

    # Esboço9 → Corte-extrusão8 (cut)
    with BuildSketch(Plane.XZ):
        Polygon((0.510057167, 3.620830633), (0.6071, 3.718655633), (0.6071, 2.609403333), (0.692033333, 2.609403333), (0.692033333, 3.883403333), (0.6741176, 3.883403333), (0.6741176, 3.795069794), (0.3690544, 3.640736667), (0.3690544, 3.551253333), align=None)
    extrude(amount=-CORTE_EXTRUS_O8_DEPTH, mode=Mode.SUBTRACT)

    # Inclinação1
    inclina_o1_faces = [part.faces().sort_by_distance(p)[0] for p in [
        (0.6741176, 0.001083333, 3.839236564),
    ]]
    draft(inclina_o1_faces, Plane(origin=(0.692033333, 0.002166667, 3.883403333), x_dir=(-1, 0, 0), z_dir=(0, 0, -1)), INCLINA_O1_ANGLE)

    # Esboço10 → Corte-Revolução1 (revolve, cut)
    with BuildSketch(Plane.XY.offset(4.455839065)):
        with Locations((-3.294667591, 500)):
            Rectangle(ESBO_O10_W, ESBO_O10_H)
    revolve(axis=Axis((-3.519667591, 1000, 4.455839065), (0, -1, 0)), mode=Mode.SUBTRACT)

    # Rebaixo para parafuso de máquina de cabeça sextavada de M31 (through all)
    with Locations(Plane.XY.offset(6.50000002)):
        with Locations((0, 990), (0, 970), (0, 950), (0, 930), (0, 910), (0, 890), (0, 870), (0, 850), (0, 830), (0, 810), (0, 790), (0, 770), (0, 750), (0, 730), (0, 710), (0, 690), (0, 670), (0, 650), (0, 630), (0, 610), (0, 590), (0, 570), (0, 550), (0, 530), (0, 510), (0, 490), (0, 470), (0, 450), (0, 430), (0, 410), (0, 390), (0, 370), (0, 350), (0, 330), (0, 310), (0, 290), (0, 270), (0, 250), (0, 230), (0, 210), (0, 190), (0, 170), (0, 150), (0, 130), (0, 110), (0, 90), (0, 70), (0, 50), (0, 30), (0, 10)):
            CounterBoreHole(REBAIXO_PARA_PARAFUSO_DE_M_QUINA_DE_CABE_D / 2, REBAIXO_PARA_PARAFUSO_DE_M_QUINA_DE_CABE_CBORE_D / 2, REBAIXO_PARA_PARAFUSO_DE_M_QUINA_DE_CABE_CBORE_DEPTH)

    # Chanfro1
    chanfro1_edges = [part.edges().sort_by_distance(p)[0] for p in [
        (-0.976240026, 999.998916667, 3.576039029),
    ]]
    chanfro1_side = [part.faces().sort_by_distance(p)[0] for p in [
        (-0.933804646, 999.998916667, 3.489868581),
    ]]
    chamfer(chanfro1_edges, length=CHANFRO1_SIZE, length2=CHANFRO1_SIZE2, reference=chanfro1_side[0])

    # Chanfro3: read off the stored shape, not the designer's step
    # Chanfro3 outline → Chanfro3 (add)
    with BuildSketch(Plane(origin=(0, 0, 0), x_dir=(0.8991051825477068, 0, 0.43773264753254887), z_dir=(0.4377326475325489, 0, -0.8991051825477069)).offset(CHANFRO3_START)):
        Polygon((1.327401403, -999.997833333), (1.31122788, -999.997833333), (1.311999664, -1000), (1.327401403, -1000), align=None)
    extrude(amount=CHANFRO3_DEPTH)

    # Chanfro4
    chanfro4_edges = [part.edges().sort_by_distance(p)[0] for p in [
        (4.5, 500, 2e-08),
        (-4.5, 500, 2e-08),
    ]]
    chamfer(chanfro4_edges, length=CHANFRO4_SIZE)

    # Filete1
    filete1_edges = [part.edges().sort_by_distance(p)[0] for p in [
        (4.030498711, 500, 4.00588336),
        (-4.026513974, 500, 4.88017535),
        (-4.5, 500, 5.328056964),
        (-4.5, 500, 3.583620931),
        (-4.026513856, 500, 4.03150278),
    ]]
    fillet(filete1_edges, radius=FILETE1_R)

    # Sketch1 → Cut-Extrude1 (cut)
    with BuildSketch(Plane(origin=(0, 0, 0), x_dir=(-1, 0, 0), z_dir=(0, 0, -1))):
        with Locations((-9.39117436, 683.776438778)):
            Rectangle(SKETCH1_W, SKETCH1_H)
        with Locations((0.25600221, 74.108809522)):
            Rectangle(SKETCH1_W_2, SKETCH1_H_2)
    extrude(amount=-CUT_EXTRUDE1_DEPTH, mode=Mode.SUBTRACT)


solid = part.part
